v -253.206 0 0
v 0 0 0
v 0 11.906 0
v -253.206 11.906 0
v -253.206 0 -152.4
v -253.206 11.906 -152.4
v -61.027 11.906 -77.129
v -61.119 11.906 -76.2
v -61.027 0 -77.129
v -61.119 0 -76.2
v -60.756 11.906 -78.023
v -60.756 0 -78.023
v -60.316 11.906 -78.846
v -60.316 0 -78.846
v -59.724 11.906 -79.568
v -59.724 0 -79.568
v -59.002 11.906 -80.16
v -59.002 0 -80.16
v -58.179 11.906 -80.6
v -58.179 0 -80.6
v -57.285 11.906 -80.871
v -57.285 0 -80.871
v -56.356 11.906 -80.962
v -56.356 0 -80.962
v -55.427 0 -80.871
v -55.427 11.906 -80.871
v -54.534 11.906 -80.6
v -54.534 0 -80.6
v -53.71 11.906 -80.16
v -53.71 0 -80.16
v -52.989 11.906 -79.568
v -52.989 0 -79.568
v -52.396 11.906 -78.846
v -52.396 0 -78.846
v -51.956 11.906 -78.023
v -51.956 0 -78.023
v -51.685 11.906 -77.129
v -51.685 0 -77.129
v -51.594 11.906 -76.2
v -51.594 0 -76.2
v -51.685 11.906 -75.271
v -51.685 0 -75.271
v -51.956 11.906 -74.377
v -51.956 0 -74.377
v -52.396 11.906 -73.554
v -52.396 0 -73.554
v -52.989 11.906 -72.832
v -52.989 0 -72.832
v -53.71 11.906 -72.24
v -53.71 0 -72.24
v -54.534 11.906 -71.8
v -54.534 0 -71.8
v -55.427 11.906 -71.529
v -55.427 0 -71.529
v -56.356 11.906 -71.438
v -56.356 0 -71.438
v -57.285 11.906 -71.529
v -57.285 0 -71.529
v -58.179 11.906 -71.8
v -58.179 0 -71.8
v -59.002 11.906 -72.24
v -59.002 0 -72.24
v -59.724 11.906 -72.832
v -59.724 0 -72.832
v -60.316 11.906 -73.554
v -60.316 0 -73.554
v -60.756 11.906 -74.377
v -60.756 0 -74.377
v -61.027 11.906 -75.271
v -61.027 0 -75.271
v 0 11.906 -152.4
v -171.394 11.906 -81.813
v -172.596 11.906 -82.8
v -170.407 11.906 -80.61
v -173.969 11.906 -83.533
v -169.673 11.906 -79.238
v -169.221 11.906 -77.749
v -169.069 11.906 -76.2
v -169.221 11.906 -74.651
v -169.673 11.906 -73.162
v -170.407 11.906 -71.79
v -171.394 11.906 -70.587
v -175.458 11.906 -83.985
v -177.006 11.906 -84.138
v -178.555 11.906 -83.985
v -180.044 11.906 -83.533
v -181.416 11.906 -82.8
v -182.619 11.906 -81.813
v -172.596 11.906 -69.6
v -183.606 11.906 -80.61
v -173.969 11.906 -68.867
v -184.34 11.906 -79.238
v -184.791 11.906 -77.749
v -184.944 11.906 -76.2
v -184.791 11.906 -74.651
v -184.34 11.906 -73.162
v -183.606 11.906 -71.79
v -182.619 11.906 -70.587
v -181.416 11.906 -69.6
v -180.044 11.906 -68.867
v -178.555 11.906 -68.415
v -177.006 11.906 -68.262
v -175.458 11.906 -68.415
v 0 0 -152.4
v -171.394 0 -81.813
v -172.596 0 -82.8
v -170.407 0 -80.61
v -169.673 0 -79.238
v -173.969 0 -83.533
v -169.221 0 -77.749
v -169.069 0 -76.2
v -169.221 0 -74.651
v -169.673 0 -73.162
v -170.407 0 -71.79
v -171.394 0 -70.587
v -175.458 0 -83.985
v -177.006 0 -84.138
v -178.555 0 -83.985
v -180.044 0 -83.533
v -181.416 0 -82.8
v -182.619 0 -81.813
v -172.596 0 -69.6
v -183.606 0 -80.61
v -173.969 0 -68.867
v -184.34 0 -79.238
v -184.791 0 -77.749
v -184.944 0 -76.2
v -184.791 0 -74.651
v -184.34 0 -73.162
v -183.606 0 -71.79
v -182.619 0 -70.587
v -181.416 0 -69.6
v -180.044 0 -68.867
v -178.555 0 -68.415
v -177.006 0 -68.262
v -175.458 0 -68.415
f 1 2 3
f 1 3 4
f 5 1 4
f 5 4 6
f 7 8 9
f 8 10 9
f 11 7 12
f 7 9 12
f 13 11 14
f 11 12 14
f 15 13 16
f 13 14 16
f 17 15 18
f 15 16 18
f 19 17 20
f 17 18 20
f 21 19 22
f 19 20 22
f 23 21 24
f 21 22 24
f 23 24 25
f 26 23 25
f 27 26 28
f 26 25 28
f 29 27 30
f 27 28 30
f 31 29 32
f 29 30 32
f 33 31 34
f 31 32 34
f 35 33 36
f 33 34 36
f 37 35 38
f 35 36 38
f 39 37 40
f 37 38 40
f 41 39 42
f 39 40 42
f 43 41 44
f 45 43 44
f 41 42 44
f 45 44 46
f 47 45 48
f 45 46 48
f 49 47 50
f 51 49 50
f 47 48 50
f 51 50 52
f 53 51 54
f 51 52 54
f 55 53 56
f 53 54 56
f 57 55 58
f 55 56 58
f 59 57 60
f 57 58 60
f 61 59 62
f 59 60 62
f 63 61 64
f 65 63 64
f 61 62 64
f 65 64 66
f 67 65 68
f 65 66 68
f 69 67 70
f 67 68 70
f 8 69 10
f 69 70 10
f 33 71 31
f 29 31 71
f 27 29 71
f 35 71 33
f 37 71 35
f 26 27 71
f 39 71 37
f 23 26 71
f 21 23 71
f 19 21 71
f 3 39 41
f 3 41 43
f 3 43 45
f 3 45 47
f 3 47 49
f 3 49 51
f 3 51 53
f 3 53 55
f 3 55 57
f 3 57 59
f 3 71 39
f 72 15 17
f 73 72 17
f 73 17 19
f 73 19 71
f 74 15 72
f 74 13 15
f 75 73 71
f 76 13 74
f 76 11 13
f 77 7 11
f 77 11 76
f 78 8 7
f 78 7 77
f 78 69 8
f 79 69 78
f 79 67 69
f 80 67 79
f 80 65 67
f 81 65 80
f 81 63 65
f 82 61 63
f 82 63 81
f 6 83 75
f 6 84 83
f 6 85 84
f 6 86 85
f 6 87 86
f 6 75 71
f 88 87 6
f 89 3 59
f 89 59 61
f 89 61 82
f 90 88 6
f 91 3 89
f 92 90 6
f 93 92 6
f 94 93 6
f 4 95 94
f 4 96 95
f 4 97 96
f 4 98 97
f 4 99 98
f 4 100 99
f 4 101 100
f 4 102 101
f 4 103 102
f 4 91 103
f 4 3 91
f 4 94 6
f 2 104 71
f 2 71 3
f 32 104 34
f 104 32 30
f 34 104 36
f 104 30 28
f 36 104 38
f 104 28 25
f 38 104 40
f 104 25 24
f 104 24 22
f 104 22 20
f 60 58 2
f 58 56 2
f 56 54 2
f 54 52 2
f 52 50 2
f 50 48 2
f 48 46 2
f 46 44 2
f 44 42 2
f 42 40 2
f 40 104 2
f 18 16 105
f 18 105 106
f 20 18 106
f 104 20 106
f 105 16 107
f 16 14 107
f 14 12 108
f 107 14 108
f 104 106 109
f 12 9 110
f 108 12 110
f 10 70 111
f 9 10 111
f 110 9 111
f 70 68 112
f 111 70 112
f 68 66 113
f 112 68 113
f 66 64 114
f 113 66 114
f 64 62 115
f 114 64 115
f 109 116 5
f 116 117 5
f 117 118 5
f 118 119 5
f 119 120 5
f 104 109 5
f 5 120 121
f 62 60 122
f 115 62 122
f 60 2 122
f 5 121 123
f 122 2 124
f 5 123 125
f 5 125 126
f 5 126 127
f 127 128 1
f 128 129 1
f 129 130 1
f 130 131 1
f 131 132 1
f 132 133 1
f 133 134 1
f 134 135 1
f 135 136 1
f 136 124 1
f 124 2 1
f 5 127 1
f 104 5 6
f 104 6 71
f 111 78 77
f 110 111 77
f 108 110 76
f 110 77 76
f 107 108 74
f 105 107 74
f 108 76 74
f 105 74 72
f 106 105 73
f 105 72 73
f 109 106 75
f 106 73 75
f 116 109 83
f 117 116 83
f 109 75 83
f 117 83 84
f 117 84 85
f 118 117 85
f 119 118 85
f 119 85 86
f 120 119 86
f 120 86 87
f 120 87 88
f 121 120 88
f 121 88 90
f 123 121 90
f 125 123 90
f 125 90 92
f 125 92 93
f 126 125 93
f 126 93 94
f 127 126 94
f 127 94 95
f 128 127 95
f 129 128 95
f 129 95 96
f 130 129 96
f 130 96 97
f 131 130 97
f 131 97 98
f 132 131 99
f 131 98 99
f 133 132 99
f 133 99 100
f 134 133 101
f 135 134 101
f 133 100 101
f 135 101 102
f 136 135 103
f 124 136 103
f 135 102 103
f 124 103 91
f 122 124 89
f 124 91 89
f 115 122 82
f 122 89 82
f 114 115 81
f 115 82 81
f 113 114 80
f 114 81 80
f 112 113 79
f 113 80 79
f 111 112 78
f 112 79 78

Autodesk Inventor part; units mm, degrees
ref_plane "YZ Plane" through (0, 0, 0) normal (1, 0, 0) x (0, 1, 0)
ref_plane "XZ Plane" through (0, 0, 0) normal (0, 1, 0) x (-1, 0, 0)
ref_plane "XY Plane" through (0, 0, 0) normal (0, 0, 1) x (1, 0, 0)
sketch "Sketch1" plane through (0, 0, 0) normal (0, 1, 0) x (-1, 0, 0)
  line L0 (0, 0) -> (253.2063, 0)
  line L1 (253.2063, 0) -> (253.2063, -152.4)
  line L2 (253.2063, -152.4) -> (0, -152.4)
  line L3 (0, -152.4) -> (0, 0)
  line L4 (0, -76.2) -> (56.3563, -76.2)
  circle A0 centre (56.3563, -76.2) radius 4.7625
  dimension "d0" = 152.4
  dimension "d1" = 253.2063
  dimension "d2" = 56.3563
  dimension "d3" = 9.525
extrude "Extrusion1" add sketch "Sketch1" along normal blind 11.9062
sketch "Sketch2" plane through (0, 11.9062, 0) normal (0, 1, 0) x (1, 0, 0)
  line L0 (0, 0) -> (0, 152.4) projected
  line L1 (0, 76.2) -> (-177.0063, 76.2)
  circle A0 centre (-177.0063, 76.2) radius 7.9375
  dimension "d6" = 177.0062
  dimension "d7" = 15.875
extrude "Extrusion2" cut sketch "Sketch2" against normal blind 11.9062
properties part number "Stage1Wall" material "Wood (Birch)"
